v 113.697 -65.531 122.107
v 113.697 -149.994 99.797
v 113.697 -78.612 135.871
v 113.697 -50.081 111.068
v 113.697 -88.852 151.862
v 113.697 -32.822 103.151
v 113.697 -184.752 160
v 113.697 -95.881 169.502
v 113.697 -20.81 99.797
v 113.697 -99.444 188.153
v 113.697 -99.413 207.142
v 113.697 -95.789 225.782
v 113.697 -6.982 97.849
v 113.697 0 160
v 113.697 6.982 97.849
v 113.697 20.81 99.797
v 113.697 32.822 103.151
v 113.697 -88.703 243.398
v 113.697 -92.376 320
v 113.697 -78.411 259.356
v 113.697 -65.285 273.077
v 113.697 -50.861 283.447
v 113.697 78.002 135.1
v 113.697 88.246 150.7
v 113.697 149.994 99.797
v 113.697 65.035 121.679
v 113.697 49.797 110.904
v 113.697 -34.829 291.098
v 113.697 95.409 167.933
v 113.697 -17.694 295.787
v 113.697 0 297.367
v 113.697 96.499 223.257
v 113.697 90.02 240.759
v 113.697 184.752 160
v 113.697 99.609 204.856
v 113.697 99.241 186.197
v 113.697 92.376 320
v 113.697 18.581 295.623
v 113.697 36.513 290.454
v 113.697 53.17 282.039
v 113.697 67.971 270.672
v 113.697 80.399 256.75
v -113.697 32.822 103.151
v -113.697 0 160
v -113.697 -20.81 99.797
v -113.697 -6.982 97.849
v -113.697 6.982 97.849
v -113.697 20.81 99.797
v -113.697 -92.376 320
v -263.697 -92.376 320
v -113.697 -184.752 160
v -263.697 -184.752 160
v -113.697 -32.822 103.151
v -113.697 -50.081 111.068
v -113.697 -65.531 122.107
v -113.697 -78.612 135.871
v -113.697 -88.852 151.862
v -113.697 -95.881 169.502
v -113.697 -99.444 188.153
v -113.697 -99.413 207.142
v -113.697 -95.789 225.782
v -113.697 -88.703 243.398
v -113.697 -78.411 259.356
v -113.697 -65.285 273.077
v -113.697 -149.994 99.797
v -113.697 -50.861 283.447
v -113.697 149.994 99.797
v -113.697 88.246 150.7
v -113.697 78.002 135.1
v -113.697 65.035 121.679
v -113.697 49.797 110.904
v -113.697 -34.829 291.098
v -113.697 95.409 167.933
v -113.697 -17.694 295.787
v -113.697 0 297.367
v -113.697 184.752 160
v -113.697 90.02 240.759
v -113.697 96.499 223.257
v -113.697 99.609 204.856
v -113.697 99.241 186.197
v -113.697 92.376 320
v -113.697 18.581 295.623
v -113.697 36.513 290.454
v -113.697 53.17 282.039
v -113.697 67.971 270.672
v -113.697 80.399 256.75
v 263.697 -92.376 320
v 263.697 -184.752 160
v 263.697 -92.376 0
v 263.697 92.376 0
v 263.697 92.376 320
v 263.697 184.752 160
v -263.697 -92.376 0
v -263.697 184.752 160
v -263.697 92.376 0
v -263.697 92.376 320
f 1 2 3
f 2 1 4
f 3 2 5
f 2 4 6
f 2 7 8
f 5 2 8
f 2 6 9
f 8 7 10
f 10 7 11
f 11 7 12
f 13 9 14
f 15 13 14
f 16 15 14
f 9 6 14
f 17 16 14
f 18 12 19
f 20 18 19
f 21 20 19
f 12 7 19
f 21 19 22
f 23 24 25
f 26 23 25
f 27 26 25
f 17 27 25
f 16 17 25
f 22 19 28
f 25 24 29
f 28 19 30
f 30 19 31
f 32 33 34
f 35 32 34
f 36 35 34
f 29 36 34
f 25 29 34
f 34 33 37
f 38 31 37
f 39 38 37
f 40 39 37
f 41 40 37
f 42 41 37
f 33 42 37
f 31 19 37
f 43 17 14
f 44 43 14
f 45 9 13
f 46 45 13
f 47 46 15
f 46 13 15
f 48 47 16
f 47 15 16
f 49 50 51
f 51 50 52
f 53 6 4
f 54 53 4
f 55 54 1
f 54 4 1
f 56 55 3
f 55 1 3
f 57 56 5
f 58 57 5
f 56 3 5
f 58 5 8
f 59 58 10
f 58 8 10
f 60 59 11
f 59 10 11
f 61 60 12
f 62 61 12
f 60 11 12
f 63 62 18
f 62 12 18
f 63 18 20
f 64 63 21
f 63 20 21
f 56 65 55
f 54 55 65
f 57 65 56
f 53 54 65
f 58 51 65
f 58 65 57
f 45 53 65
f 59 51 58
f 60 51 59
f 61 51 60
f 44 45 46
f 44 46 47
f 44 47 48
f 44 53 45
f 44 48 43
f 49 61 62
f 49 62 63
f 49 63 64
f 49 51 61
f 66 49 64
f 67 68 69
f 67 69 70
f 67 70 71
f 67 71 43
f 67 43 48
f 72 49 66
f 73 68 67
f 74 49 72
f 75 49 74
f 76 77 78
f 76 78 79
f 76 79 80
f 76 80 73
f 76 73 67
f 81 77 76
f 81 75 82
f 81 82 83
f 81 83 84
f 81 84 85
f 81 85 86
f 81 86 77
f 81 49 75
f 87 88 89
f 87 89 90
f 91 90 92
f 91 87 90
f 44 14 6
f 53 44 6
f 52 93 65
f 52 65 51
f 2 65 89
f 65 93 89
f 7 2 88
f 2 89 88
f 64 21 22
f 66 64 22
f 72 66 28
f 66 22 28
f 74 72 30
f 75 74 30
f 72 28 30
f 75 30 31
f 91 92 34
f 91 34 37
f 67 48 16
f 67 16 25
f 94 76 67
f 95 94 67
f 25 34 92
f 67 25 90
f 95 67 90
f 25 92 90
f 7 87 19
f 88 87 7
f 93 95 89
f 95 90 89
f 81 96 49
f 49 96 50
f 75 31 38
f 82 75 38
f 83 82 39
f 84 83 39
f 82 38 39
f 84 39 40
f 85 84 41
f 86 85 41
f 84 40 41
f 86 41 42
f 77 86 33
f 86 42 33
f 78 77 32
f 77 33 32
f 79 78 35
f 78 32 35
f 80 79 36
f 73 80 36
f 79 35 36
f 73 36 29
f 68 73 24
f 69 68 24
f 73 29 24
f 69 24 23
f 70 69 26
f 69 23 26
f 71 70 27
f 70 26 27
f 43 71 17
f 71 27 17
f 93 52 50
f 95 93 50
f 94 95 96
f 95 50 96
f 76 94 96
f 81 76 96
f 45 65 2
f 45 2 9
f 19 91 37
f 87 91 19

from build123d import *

# Parameters (mm, degrees)
F3_DEPTH = 150
F6_DEPTH = 227.39467
F7_DEPTH = 227.39467


with BuildPart() as f3:
    # F2 (on line) → F3 (new body)
    with BuildSketch(Plane.YZ.offset(263.697335)):
        Polygon((0, 320), (0, 0), (92.3760430703, 0), (184.7520861407, 160), (92.3760430703, 320), align=None)
        Polygon((-92.3760430703, 0), (0, 0), (0, 320), (-92.3760430703, 320), (-184.7520861407, 160), align=None)
    extrude(amount=-F3_DEPTH)


with BuildPart() as f4_1:
    # F4: instance of F3
    add(f3.part.mirror(Plane.YZ))


with BuildPart() as f3_1:
    add(f3.part)

    add(f4_1.part)  # F6 merges F4_1
    # F5 (on face) → F6 (join, through all)
    with BuildSketch(Plane(origin=(113.697335, 0, 0), x_dir=(0, -1, 0), z_dir=(-1, 0, 0))):
        Polygon((-149.9936365076, 99.7965992432), (-92.3760430703, 0), (-34.7584496331, 99.7965992432), align=None)
        with BuildLine():
            Line((-34.7584496331, 99.7965992432), (-92.3760430703, 0))
            Line((-92.3760430703, 0), (92.3760430703, 0))
            Line((92.3760430703, 0), (34.7584496331, 99.7965992432))
            Line((34.7584496331, 99.7965992432), (20.8100413197, 99.7965992432))
            ThreePointArc((20.8100413197, 99.7965992432), (0, 97.6046816163), (-20.8100413197, 99.7965992432))
            Line((-20.8100413197, 99.7965992432), (-34.7584496331, 99.7965992432))
        make_face()
        Polygon((34.7584496331, 99.7965992432), (92.3760430703, 0), (149.9936365076, 99.7965992432), align=None)
    extrude(amount=F6_DEPTH)

    # F5 (on face) → F7 (join, through all)
    with BuildSketch(Plane(origin=(113.697335, 0, 0), x_dir=(0, -1, 0), z_dir=(-1, 0, 0))):
        with BuildLine():
            Line((-92.5799725491, 160), (0, 160))
            Line((0, 160), (0, 297.366897697))
            ThreePointArc((0, 297.366897697), (-82.8261973956, 253.3074410864), (-92.5799725491, 160))
        make_face()
        with BuildLine():
            Line((0, 297.366897697), (0, 160))
            Line((0, 160), (65.2852114178, 273.0773031585))
            ThreePointArc((65.2852114178, 273.0773031585), (34.8286636002, 291.0977543577), (0, 297.366897697))
        make_face()
        with BuildLine():
            Line((65.2852114178, 273.0773031585), (0, 160))
            Line((0, 160), (92.5799725491, 160))
            ThreePointArc((92.5799725491, 160), (98.0388341014, 178.3906920813), (99.8811080403, 197.4857896566))
            ThreePointArc((99.8811080403, 197.4857896566), (90.8212392517, 239.0518604856), (65.2852114178, 273.0773031585))
        make_face()
        with BuildLine():
            Line((92.5799725491, 160), (0, 160))
            Line((0, 160), (32.8215652942, 103.1513813265))
            ThreePointArc((32.8215652942, 103.1513813265), (68.8427758348, 125.1193059869), (92.5799725491, 160))
        make_face()
        with BuildLine():
            ThreePointArc((-92.5799725491, 160), (-68.8427758348, 125.1193059868), (-32.8215652942, 103.1513813265))
            Line((-32.8215652942, 103.1513813265), (0, 160))
            Line((0, 160), (-92.5799725491, 160))
        make_face()
    extrude(amount=F7_DEPTH)


solid = f3_1.part
